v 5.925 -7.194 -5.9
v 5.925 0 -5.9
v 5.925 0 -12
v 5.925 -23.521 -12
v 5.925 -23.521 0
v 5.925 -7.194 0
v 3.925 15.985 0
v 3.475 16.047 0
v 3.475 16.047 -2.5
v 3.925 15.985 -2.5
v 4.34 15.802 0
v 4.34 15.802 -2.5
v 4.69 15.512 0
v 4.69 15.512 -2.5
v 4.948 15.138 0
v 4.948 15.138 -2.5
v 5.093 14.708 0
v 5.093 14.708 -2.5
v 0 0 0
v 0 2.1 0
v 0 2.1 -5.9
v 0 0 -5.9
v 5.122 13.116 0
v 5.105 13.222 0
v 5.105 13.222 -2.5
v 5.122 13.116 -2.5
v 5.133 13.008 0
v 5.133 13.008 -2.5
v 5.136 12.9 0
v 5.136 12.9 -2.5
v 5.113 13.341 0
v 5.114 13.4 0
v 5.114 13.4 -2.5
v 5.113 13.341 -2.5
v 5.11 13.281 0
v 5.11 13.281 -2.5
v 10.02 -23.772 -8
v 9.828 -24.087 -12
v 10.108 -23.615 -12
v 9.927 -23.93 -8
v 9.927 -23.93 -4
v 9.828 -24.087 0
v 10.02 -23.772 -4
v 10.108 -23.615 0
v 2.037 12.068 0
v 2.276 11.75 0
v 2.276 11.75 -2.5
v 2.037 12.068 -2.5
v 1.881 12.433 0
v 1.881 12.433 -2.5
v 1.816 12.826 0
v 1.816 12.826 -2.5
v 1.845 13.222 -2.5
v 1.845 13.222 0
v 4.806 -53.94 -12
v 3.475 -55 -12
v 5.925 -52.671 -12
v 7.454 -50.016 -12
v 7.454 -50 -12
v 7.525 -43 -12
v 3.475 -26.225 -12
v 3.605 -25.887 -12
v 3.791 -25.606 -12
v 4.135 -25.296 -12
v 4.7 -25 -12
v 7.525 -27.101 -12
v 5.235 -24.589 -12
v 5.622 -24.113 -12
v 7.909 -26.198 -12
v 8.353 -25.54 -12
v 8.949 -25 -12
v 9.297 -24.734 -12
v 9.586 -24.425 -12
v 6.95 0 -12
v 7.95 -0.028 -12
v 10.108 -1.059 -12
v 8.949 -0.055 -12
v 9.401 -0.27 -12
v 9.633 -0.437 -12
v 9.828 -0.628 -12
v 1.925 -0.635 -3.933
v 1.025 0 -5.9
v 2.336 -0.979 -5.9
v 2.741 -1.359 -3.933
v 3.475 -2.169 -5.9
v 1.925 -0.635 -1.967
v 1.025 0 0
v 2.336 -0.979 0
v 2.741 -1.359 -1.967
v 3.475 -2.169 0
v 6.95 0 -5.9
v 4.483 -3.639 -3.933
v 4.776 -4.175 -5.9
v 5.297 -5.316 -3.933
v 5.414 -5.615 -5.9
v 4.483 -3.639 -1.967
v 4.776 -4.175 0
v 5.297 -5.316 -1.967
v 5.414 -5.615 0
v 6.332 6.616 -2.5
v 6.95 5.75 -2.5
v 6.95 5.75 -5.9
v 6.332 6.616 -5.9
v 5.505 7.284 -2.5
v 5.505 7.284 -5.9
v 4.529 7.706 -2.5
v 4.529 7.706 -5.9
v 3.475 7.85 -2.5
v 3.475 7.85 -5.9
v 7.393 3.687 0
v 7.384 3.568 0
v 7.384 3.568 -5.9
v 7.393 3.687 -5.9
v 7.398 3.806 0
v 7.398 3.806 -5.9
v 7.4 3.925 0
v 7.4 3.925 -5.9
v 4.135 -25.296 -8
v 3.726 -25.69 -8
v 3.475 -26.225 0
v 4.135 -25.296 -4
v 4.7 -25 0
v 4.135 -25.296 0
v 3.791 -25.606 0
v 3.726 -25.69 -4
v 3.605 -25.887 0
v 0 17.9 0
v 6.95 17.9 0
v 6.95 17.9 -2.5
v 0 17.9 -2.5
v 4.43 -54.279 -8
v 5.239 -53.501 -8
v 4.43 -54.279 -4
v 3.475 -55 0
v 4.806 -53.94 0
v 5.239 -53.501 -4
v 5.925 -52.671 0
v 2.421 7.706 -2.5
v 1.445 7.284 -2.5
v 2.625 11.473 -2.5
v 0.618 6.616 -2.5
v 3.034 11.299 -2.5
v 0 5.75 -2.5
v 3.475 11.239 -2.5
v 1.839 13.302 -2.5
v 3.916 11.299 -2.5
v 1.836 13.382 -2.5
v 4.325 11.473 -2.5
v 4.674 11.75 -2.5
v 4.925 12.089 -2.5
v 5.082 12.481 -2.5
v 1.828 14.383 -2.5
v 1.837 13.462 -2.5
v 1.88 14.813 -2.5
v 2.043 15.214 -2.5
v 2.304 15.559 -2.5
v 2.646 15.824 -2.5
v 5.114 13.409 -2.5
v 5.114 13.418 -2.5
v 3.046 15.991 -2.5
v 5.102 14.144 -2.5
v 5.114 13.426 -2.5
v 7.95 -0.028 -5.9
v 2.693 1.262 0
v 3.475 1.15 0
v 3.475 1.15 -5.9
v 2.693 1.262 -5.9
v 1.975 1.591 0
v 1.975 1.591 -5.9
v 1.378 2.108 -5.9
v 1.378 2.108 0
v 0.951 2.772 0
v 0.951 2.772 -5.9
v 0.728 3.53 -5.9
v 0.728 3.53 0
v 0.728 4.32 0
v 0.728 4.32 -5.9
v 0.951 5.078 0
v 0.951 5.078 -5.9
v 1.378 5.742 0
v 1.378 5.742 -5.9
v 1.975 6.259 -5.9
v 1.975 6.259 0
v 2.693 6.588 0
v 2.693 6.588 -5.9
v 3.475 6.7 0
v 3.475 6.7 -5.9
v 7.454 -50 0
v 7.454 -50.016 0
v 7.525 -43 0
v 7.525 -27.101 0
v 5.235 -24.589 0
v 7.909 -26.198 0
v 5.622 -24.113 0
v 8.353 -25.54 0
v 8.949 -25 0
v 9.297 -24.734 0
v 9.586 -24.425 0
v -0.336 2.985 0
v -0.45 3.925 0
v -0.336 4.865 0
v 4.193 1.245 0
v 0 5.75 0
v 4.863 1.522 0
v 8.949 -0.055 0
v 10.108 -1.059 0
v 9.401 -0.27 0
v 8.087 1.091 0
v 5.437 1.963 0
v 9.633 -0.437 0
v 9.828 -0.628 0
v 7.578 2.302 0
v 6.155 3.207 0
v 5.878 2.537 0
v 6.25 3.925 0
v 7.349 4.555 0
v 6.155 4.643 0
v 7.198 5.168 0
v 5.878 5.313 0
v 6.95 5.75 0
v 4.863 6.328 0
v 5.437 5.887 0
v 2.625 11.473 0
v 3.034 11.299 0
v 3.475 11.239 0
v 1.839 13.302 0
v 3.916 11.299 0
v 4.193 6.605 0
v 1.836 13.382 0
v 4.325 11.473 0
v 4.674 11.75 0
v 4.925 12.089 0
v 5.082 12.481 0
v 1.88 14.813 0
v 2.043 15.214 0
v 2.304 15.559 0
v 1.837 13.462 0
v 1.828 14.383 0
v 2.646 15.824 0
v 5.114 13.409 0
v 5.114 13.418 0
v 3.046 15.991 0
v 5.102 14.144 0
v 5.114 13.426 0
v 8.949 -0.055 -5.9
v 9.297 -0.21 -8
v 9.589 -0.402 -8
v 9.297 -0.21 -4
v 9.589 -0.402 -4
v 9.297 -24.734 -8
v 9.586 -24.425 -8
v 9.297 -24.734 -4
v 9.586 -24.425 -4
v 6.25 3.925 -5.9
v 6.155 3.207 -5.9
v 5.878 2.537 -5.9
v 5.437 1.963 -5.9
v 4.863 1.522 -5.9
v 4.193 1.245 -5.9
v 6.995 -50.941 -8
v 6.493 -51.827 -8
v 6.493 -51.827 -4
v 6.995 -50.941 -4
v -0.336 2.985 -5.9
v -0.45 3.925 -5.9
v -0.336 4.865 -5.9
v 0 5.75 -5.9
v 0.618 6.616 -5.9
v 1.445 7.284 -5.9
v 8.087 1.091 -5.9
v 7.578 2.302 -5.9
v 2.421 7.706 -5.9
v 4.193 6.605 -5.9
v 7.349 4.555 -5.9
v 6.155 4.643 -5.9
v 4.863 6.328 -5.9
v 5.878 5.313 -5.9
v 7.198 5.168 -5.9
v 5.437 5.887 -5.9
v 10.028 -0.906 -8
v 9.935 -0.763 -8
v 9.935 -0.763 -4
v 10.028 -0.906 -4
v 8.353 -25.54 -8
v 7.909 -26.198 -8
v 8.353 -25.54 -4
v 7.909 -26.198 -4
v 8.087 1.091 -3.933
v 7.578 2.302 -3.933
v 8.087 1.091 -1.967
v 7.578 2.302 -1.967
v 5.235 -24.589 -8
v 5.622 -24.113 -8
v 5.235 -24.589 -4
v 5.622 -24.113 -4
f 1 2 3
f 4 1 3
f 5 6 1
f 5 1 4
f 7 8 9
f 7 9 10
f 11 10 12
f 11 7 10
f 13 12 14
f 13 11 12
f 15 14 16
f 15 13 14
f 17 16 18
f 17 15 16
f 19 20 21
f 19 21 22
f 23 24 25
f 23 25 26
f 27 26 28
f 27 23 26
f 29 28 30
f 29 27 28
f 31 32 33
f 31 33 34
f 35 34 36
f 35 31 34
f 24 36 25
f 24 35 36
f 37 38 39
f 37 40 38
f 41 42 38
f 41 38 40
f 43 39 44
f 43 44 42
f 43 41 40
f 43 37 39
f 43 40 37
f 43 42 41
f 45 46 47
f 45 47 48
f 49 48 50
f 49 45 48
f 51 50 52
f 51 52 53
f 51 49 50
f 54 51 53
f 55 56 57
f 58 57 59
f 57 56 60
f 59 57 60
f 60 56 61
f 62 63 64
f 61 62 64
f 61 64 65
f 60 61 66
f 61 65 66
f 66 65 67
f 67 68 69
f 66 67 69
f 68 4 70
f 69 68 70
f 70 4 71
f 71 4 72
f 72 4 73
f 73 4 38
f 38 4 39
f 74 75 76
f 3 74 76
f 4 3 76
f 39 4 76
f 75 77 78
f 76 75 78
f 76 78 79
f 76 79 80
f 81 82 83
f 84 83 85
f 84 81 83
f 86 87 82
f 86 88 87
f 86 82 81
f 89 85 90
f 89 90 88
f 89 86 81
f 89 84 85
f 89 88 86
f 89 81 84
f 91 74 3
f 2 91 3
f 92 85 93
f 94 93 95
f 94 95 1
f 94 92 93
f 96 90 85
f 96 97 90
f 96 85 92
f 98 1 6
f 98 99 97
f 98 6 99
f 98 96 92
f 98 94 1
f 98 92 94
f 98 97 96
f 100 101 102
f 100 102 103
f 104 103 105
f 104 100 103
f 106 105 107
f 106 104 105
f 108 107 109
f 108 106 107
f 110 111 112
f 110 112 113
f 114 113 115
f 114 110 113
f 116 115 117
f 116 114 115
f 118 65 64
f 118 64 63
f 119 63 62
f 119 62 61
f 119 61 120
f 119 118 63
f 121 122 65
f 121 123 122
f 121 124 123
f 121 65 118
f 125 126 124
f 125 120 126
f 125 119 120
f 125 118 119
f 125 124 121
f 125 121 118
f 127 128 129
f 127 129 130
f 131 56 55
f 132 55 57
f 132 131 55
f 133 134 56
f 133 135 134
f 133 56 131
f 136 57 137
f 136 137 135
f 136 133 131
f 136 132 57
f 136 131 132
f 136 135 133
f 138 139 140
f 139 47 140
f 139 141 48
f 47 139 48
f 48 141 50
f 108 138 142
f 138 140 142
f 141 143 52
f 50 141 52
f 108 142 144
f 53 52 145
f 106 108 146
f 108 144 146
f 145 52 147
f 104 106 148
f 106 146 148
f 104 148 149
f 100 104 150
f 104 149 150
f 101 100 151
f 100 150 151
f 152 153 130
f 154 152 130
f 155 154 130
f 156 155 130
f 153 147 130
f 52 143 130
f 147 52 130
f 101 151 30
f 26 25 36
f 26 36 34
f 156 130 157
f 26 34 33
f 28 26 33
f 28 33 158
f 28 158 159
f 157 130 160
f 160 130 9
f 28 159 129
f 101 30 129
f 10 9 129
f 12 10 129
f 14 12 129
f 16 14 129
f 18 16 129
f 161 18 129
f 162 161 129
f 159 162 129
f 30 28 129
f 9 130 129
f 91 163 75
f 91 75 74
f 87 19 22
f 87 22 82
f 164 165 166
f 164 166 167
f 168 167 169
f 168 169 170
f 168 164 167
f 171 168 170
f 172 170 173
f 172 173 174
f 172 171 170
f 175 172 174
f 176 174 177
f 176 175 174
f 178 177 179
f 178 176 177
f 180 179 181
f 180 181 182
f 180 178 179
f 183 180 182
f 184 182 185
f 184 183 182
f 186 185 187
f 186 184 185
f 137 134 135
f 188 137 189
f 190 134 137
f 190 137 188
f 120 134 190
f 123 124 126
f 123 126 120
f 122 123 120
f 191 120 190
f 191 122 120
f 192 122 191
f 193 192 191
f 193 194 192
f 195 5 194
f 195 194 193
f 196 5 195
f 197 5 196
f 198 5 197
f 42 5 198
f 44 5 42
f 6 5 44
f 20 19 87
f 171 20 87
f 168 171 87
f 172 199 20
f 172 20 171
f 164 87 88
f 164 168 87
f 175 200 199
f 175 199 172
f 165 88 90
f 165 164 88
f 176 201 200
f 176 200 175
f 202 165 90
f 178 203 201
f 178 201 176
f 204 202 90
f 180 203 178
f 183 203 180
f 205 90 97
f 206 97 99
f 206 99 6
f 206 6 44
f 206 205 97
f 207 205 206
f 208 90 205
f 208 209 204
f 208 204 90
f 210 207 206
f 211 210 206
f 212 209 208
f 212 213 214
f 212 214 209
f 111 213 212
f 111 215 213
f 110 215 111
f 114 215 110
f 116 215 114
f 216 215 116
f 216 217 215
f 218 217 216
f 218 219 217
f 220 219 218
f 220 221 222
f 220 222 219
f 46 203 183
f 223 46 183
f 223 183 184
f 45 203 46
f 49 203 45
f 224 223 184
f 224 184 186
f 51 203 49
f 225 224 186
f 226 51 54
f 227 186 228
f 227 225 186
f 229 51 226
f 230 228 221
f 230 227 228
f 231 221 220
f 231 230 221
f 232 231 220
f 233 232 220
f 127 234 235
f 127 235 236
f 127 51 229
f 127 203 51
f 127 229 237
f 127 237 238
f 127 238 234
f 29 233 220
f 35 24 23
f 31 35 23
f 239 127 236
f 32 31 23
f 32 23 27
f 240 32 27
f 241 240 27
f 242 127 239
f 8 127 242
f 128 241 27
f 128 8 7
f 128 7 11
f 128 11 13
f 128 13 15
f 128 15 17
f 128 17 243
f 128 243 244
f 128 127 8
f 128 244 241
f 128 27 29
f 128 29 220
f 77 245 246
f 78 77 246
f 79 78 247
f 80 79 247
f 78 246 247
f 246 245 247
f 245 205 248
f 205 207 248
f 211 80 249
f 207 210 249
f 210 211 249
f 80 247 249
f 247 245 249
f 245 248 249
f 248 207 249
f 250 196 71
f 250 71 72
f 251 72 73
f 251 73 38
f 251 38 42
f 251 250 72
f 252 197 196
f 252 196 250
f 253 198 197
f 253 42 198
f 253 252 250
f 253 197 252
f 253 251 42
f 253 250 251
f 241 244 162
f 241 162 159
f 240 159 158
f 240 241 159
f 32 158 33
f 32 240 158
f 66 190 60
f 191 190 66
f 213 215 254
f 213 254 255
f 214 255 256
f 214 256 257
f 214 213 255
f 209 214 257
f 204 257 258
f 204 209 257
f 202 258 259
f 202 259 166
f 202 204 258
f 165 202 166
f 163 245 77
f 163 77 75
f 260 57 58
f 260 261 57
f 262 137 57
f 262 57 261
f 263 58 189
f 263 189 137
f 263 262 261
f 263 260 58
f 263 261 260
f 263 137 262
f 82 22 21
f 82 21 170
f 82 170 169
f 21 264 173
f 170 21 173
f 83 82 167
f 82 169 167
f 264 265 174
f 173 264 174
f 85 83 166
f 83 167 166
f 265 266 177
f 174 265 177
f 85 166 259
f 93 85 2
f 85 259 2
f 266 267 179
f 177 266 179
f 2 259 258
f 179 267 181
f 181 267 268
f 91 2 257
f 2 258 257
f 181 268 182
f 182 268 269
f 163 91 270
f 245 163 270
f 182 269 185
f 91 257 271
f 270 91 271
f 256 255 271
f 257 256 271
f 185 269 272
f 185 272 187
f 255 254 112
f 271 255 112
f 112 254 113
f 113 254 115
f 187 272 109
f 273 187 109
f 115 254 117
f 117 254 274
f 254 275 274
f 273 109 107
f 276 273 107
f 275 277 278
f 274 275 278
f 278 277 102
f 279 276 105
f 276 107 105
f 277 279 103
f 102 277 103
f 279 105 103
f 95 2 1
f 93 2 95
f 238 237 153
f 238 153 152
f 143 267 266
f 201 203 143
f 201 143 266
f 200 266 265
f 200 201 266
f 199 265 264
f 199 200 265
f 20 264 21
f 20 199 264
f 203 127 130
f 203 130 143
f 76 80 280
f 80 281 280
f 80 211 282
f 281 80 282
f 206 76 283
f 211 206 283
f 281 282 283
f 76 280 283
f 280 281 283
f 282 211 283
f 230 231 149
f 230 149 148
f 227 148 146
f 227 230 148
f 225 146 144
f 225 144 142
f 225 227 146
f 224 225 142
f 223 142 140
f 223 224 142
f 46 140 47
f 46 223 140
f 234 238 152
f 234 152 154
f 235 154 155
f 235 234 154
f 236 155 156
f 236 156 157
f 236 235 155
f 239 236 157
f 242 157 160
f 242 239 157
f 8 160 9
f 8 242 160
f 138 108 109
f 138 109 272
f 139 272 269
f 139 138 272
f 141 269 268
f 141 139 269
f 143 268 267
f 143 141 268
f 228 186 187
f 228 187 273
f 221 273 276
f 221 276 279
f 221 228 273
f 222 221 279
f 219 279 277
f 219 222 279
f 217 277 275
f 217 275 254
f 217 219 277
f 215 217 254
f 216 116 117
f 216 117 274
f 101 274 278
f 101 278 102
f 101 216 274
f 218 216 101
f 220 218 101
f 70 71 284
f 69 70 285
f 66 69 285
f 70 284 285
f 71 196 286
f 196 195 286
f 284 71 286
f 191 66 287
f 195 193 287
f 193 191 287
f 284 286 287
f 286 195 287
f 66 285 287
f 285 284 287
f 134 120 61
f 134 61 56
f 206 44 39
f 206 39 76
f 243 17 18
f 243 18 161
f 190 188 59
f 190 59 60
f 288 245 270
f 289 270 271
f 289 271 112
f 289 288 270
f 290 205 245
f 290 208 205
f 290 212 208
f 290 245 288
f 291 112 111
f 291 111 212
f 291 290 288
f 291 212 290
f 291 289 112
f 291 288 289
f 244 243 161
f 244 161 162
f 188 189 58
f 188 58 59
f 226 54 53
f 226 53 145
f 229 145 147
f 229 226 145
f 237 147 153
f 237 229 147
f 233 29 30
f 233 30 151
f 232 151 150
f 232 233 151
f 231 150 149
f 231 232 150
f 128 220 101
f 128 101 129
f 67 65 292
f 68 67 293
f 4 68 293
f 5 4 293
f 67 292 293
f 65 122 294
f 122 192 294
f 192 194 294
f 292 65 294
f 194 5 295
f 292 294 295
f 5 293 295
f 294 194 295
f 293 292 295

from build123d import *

# Parameters (mm, degrees)
F1_DEPTH = 5.9
F2_DEPTH = 2.5
F3_DEPTH = 5.9
F4_DEPTH = 12
F5_DEPTH = 12


with BuildPart() as f1:
    # F0 (on Top) → F1 (new body)
    with BuildSketch(Plane.XY):
        with BuildLine():
            Line((3.475, 1.15), (3.475, 0))
            ThreePointArc((3.475, 0), (4.7730375063, 0.2208504846), (5.925, 0.8585484677))
            ThreePointArc((5.925, 0.8585484677), (6.5018486959, 1.426237912), (6.95, 2.1001712409))
            Line((6.95, 2.1001712409), (6.95, 5.7498287591))
            ThreePointArc((6.95, 5.7498287591), (5.5051689733, 7.2841723593), (3.475, 7.85))
            Line((3.475, 7.85), (3.475, 6.8908035755))
            Line((3.475, 6.8908035755), (3.475, 6.7))
            ThreePointArc((3.475, 6.7), (5.4372213178, 5.8872213178), (6.25, 3.925))
            ThreePointArc((6.25, 3.925), (5.4372213178, 1.9627786822), (3.475, 1.15))
        make_face()
        with BuildLine():
            Line((6.95, 5.7498287591), (6.95, 2.1001712409))
            ThreePointArc((6.95, 2.1001712409), (7.2391359007, 2.8128372775), (7.3837493972, 3.5682043308))
            ThreePointArc((7.3837493972, 3.5682043308), (7.3959352446, 3.7464172239), (7.4, 3.925))
            ThreePointArc((7.4, 3.925), (7.2858398025, 4.8647473065), (6.95, 5.7498287591))
        make_face()
        with BuildLine():
            Line((0, 5.7498287591), (0, 2.1001712409))
            ThreePointArc((0, 2.1001712409), (0.4481513041, 1.426237912), (1.025, 0.8585484677))
            ThreePointArc((1.025, 0.8585484677), (2.1769624937, 0.2208504846), (3.475, 0))
            Line((3.475, 0), (3.475, 1.15))
            ThreePointArc((3.475, 1.15), (0.7, 3.925), (3.475, 6.7))
            Line((3.475, 6.7), (3.475, 6.8908035755))
            Line((3.475, 6.8908035755), (3.475, 7.85))
            ThreePointArc((3.475, 7.85), (1.4448310267, 7.2841723593), (0, 5.7498287591))
        make_face()
        with BuildLine():
            ThreePointArc((0, 5.7498287591), (-0.45, 3.925), (0, 2.1001712409))
            Line((0, 2.1001712409), (0, 5.7498287591))
        make_face()
        with BuildLine():
            ThreePointArc((6.95, 2.1001712409), (6.5018486959, 1.426237912), (5.925, 0.8585484677))
            Line((5.925, 0.8585484677), (5.925, 0))
            Line((5.925, 0), (6.95, 0))
            Line((6.95, 0), (6.95, 0.75))
            Line((6.95, 0.75), (6.95, 1.44))
            Line((6.95, 1.44), (6.95, 1.5))
            Line((6.95, 1.5), (6.95, 2.1001712409))
        make_face()
        with BuildLine():
            Line((0, 2.1001712409), (0, 0))
            Line((0, 0), (1.025, 0))
            Line((1.025, 0), (1.025, 0.8585484677))
            ThreePointArc((1.025, 0.8585484677), (0.4481513041, 1.426237912), (0, 2.1001712409))
        make_face()
        with BuildLine():
            Line((1.025, 0.8585484677), (1.025, 0))
            Line((1.025, 0), (3.475, 0))
            ThreePointArc((3.475, 0), (2.1769624937, 0.2208504846), (1.025, 0.8585484677))
        make_face()
        with BuildLine():
            ThreePointArc((5.925, 0.8585484677), (4.7730375063, 0.2208504846), (3.475, 0))
            Line((3.475, 0), (4.7, 0))
            Line((4.7, 0), (5.925, 0))
            Line((5.925, 0), (5.925, 0.8585484677))
        make_face()
        with BuildLine():
            Line((5.925, 0), (4.7, 0))
            add(Edge.make_bspline(
                [(4.7, 0), (5.2537494339, -0.3164176305), (5.6369397789, -0.7196032093), (5.925, -1.225)],
                knots=[0, 0, 0, 0, 1.7324116139, 1.7324116139, 1.7324116139, 1.7324116139], degree=3))
            Line((5.925, -1.225), (5.925, -0.079424061))
            Line((5.925, -0.079424061), (5.925, 0))
        make_face()
        with BuildLine():
            Line((6.95, 0.75), (6.95, 0))
            Line((6.95, 0), (7.9496195498, -0.0275818011))
            add(Edge.make_bspline(
                [(7.9496195498, -0.0275818011), (7.5186002068, 0.1973926119), (7.1600275114, 0.4521599913), (6.95, 0.75)],
                knots=[0, 0, 0, 0, 1.2664409586, 1.2664409586, 1.2664409586, 1.2664409586], degree=3))
        make_face()
    extrude(amount=-F1_DEPTH)

    # F0 (on Top) → F2 (join)
    with BuildSketch(Plane.XY):
        with BuildLine():
            Line((0, 7.85), (0, 5.7498287591))
            ThreePointArc((0, 5.7498287591), (1.4448310267, 7.2841723593), (3.475, 7.85))
            ThreePointArc((3.475, 7.85), (5.5051689733, 7.2841723593), (6.95, 5.7498287591))
            Line((6.95, 5.7498287591), (6.95, 17.9))
            Line((6.95, 17.9), (3.475, 17.9))
            Line((3.475, 17.9), (0, 17.9))
            Line((0, 17.9), (0, 7.85))
        make_face()
        with BuildLine():
            ThreePointArc((1.8276640256, 14.3833613398), (2.3042302705, 15.55900427), (3.475, 16.0474200003))
            ThreePointArc((3.475, 16.0474200003), (4.5253988967, 15.6691157612), (5.0933824344, 14.7079463483))
            Line((5.0933824344, 14.7079463483), (5.1024433757, 14.1442252627))
            Line((5.1024433757, 14.1442252627), (5.113982201, 13.4263440945))
            ThreePointArc((5.113982201, 13.4263440945), (5.1141409801, 13.4131724726), (5.1141939076, 13.4))
            ThreePointArc((5.1141939076, 13.4), (5.1117771913, 13.3110219533), (5.1045341684, 13.222306273))
            ThreePointArc((5.1045341684, 13.222306273), (5.1281919004, 13.0619243035), (5.1361029286, 12.9))
            ThreePointArc((5.1361029286, 12.9), (5.0161594238, 12.2802495905), (4.673650466, 11.75))
            ThreePointArc((4.673650466, 11.75), (3.475, 11.2388970714), (2.276349534, 11.75))
            ThreePointArc((2.276349534, 11.75), (1.8807671055, 12.4334333727), (1.8454658316, 13.222306273))
            ThreePointArc((1.8454658316, 13.222306273), (1.8368359194, 13.3419042896), (1.8369719791, 13.4618131819))
            Line((1.8369719791, 13.4618131819), (1.8276640256, 14.3833613398))
        make_face(mode=Mode.SUBTRACT)
    extrude(amount=-F2_DEPTH)

    # F0 (on Top) → F3 (join)
    with BuildSketch(Plane.XY):
        with BuildLine():
            Line((6.95, 5.7498287591), (6.95, 2.1001712409))
            ThreePointArc((6.95, 2.1001712409), (7.2391359007, 2.8128372775), (7.3837493972, 3.5682043308))
            ThreePointArc((7.3837493972, 3.5682043308), (7.3959352446, 3.7464172239), (7.4, 3.925))
            ThreePointArc((7.4, 3.925), (7.2858398025, 4.8647473065), (6.95, 5.7498287591))
        make_face()
        with BuildLine():
            Line((6.95, 0.75), (6.95, 0))
            Line((6.95, 0), (7.9496195498, -0.0275818011))
            add(Edge.make_bspline(
                [(7.9496195498, -0.0275818011), (7.5186002068, 0.1973926119), (7.1600275114, 0.4521599913), (6.95, 0.75)],
                knots=[0, 0, 0, 0, 1.2664409586, 1.2664409586, 1.2664409586, 1.2664409586], degree=3))
        make_face()
        with BuildLine():
            ThreePointArc((7.3837493972, 3.5682043308), (7.2391359007, 2.8128372775), (6.95, 2.1001712409))
            Line((6.95, 2.1001712409), (6.95, 1.5))
            Line((6.95, 1.5), (6.95, 1.44))
            Line((6.95, 1.44), (6.95, 0.75))
            add(Edge.make_bspline(
                [(7.9496195498, -0.0275818011), (7.5186002068, 0.1973926119), (7.1600275114, 0.4521599913), (6.95, 0.75)],
                knots=[0, 0, 0, 0, 1.2664409586, 1.2664409586, 1.2664409586, 1.2664409586], degree=3))
            Line((7.9496195498, -0.0275818011), (8.9492390995, -0.0551636022))
            add(Edge.make_bspline(
                [(8.9492390995, -0.0551636022), (7.8965900466, 1.0567778954), (7.4345106259, 2.2768541239), (7.3837493972, 3.5682043308)],
                knots=[0, 0, 0, 0, 3.9470942713, 3.9470942713, 3.9470942713, 3.9470942713], degree=3))
        make_face()
        with BuildLine():
            Line((3.475, 0), (1.025, 0))
            add(Edge.make_bspline(
                [(1.025, 0), (1.9679788021, -0.5904915447), (2.7813095381, -1.3164345806), (3.475, -2.169177953)],
                knots=[0, 0, 0, 0, 3.3501258039, 3.3501258039, 3.3501258039, 3.3501258039], degree=3))
            Line((3.475, -2.169177953), (3.475, -1.225))
            Line((3.475, -1.225), (3.475, 0))
        make_face()
        with BuildLine():
            Line((4.7, 0), (3.475, 0))
            Line((3.475, 0), (3.475, -1.225))
            Line((3.475, -1.225), (3.475, -2.169177953))
            add(Edge.make_bspline(
                [(3.475, -2.169177953), (4.583621136, -3.5319894349), (5.386671183, -5.2186593933), (5.925, -7.1938754991)],
                knots=[3.3501258039, 3.3501258039, 3.3501258039, 3.3501258039, 8.7041280262, 8.7041280262, 8.7041280262, 8.7041280262], degree=3))
            Line((5.925, -7.1938754991), (5.925, -1.225))
            add(Edge.make_bspline(
                [(4.7, 0), (5.2537494339, -0.3164176305), (5.6369397789, -0.7196032093), (5.925, -1.225)],
                knots=[0, 0, 0, 0, 1.7324116139, 1.7324116139, 1.7324116139, 1.7324116139], degree=3))
        make_face()
    extrude(amount=-F3_DEPTH)

    # F0 (on Top) → F4 (join)
    with BuildSketch(Plane.XY):
        with BuildLine():
            Line((5.925, -1.225), (5.925, -7.1938754991))
            Line((5.925, -7.1938754991), (5.925, -21.3844068348))
            Line((5.925, -21.3844068348), (5.925, -22.55))
            Line((5.925, -22.55), (5.925, -22.9875))
            Line((5.925, -22.9875), (5.925, -23.5205553472))
            Line((5.925, -23.5205553472), (5.925, -25))
            Line((5.925, -25), (7.525, -25))
            Line((7.525, -25), (8.9492390995, -25))
            Line((8.9492390995, -25), (8.9492390995, -0.9913714603))
            add(Edge.make_bspline(
                [(7.9496195498, -0.0275818011), (8.4295123816, -0.2455351059), (8.7658986449, -0.6068330258), (8.9492390995, -0.9913714603)],
                knots=[0, 0, 0, 0, 1.3885711186, 1.3885711186, 1.3885711186, 1.3885711186], degree=3))
            Line((7.9496195498, -0.0275818011), (6.95, 0))
            Line((6.95, 0), (5.925, 0))
            Line((5.925, 0), (5.925, -0.079424061))
            Line((5.925, -0.079424061), (5.925, -1.225))
        make_face()
        with BuildLine():
            add(Edge.make_bspline(
                [(4.7, -25), (4.0586842224, -25.2618398517), (3.6450892221, -25.6055109203), (3.475, -26.225)],
                knots=[0, 0, 0, 0, 1.7324116139, 1.7324116139, 1.7324116139, 1.7324116139], degree=3))
            Line((3.475, -26.225), (3.475, -48.775))
            Line((3.475, -48.775), (3.475, -50))
            Line((3.475, -50), (5.925, -50))
            Line((5.925, -50), (5.925, -47.55))
            Line((5.925, -47.55), (5.925, -43))
            Line((5.925, -43), (5.925, -28.903))
            Line((5.925, -28.903), (5.925, -26.9515))
            Line((5.925, -26.9515), (5.925, -25))
            Line((5.925, -25), (4.7, -25))
        make_face()
        with BuildLine():
            add(Edge.make_bspline(
                [(4.7, -25), (5.3314492106, -24.6048551053), (5.6424522772, -24.1878218949), (5.925, -23.5205553472)],
                knots=[0, 0, 0, 0, 1.9207762703, 1.9207762703, 1.9207762703, 1.9207762703], degree=3))
            Line((4.7, -25), (5.925, -25))
            Line((5.925, -25), (5.925, -23.5205553472))
        make_face()
        with BuildLine():
            Line((8.9492390995, -0.0551636022), (7.9496195498, -0.0275818011))
            add(Edge.make_bspline(
                [(7.9496195498, -0.0275818011), (8.4295123816, -0.2455351059), (8.7658986449, -0.6068330258), (8.9492390995, -0.9913714603)],
                knots=[0, 0, 0, 0, 1.3885711186, 1.3885711186, 1.3885711186, 1.3885711186], degree=3))
            Line((8.9492390995, -0.9913714603), (8.9492390995, -0.0551636022))
        make_face()
        with BuildLine():
            add(Edge.make_bspline(
                [(8.9492390995, -0.0551636022), (9.326442021, -0.1917248564), (9.6147849957, -0.3848434336), (9.8284865708, -0.6283950562)],
                knots=[0, 0, 0, 0, 1.0008605929, 1.0008605929, 1.0008605929, 1.0008605929], degree=3))
            Line((8.9492390995, -0.0551636022), (8.9492390995, -0.9913714603))
            Line((8.9492390995, -0.9913714603), (8.9492390995, -25))
            add(Edge.make_bspline(
                [(8.9492390995, -25), (9.331126801, -24.7616745123), (9.6040893739, -24.433150219), (9.8284865708, -24.0874149632)],
                knots=[0, 0, 0, 0, 1.2440499597, 1.2440499597, 1.2440499597, 1.2440499597], degree=3))
            Line((9.8284865708, -24.0874149632), (9.8284865708, -0.6283950562))
        make_face()
        Polygon((7.525, -25), (5.925, -25), (5.925, -26.9515), (5.925, -28.903), (5.925, -43), (7.525, -43), (7.525, -27.1006729454), align=None)
        with BuildLine():
            add(Edge.make_bspline(
                [(9.8284865708, -0.6283950562), (9.942237153, -0.7580344322), (10.0348396241, -0.9019629784), (10.1084383205, -1.0592570761)],
                knots=[1.0008605929, 1.0008605929, 1.0008605929, 1.0008605929, 1.533605731, 1.533605731, 1.533605731, 1.533605731], degree=3))
            Line((9.8284865708, -0.6283950562), (9.8284865708, -24.0874149632))
            add(Edge.make_bspline(
                [(9.8284865708, -24.0874149632), (9.9298603822, -23.9312253982), (10.0213226008, -23.7715232886), (10.1084383205, -23.6150380224)],
                knots=[1.2440499597, 1.2440499597, 1.2440499597, 1.2440499597, 1.8060627102, 1.8060627102, 1.8060627102, 1.8060627102], degree=3))
            Line((10.1084383205, -23.6150380224), (10.1084383205, -1.0592570761))
        make_face()
        with BuildLine():
            Line((5.925, -50), (3.475, -50))
            Line((3.475, -50), (3.475, -55))
            add(Edge.make_bspline(
                [(3.475, -55), (4.512583722, -54.3078648135), (5.2908616095, -53.5264365704), (5.925, -52.6706067544)],
                knots=[0, 0, 0, 0, 3.2551675464, 3.2551675464, 3.2551675464, 3.2551675464], degree=3))
            Line((5.925, -52.6706067544), (5.925, -52.0125))
            Line((5.925, -52.0125), (5.925, -50))
        make_face()
        with BuildLine():
            Line((8.9492390995, -25), (7.525, -25))
            Line((7.525, -25), (7.525, -27.1006729454))
            add(Edge.make_bspline(
                [(8.9492390995, -25), (8.2447035238, -25.5232192576), (7.9111177474, -26.03264153), (7.525, -27.1006729454)],
                knots=[0, 0, 0, 0, 2.5379684466, 2.5379684466, 2.5379684466, 2.5379684466], degree=3))
        make_face()
        with BuildLine():
            Line((7.4536274492, -50.0155514561), (5.925, -50))
            Line((5.925, -50), (5.925, -52.0125))
            Line((5.925, -52.0125), (5.925, -52.6706067544))
            add(Edge.make_bspline(
                [(5.925, -52.6706067544), (6.5332867434, -51.8496661845), (7.0089465882, -50.9602665865), (7.4536274492, -50.0155514561)],
                knots=[3.2551675464, 3.2551675464, 3.2551675464, 3.2551675464, 6.3776330772, 6.3776330772, 6.3776330772, 6.3776330772], degree=3))
        make_face()
        Polygon((5.925, -47.55), (5.925, -50), (7.4537856616, -50), (7.525, -43), (5.925, -43), align=None)
    extrude(amount=-F4_DEPTH)

    # F0 (on Top) → F5 (join)
    with BuildSketch(Plane.XY):
        Polygon((7.4537856616, -50), (5.925, -50), (7.4536274492, -50.0155514561), align=None)
    extrude(amount=-F5_DEPTH)


solid = f1.part
